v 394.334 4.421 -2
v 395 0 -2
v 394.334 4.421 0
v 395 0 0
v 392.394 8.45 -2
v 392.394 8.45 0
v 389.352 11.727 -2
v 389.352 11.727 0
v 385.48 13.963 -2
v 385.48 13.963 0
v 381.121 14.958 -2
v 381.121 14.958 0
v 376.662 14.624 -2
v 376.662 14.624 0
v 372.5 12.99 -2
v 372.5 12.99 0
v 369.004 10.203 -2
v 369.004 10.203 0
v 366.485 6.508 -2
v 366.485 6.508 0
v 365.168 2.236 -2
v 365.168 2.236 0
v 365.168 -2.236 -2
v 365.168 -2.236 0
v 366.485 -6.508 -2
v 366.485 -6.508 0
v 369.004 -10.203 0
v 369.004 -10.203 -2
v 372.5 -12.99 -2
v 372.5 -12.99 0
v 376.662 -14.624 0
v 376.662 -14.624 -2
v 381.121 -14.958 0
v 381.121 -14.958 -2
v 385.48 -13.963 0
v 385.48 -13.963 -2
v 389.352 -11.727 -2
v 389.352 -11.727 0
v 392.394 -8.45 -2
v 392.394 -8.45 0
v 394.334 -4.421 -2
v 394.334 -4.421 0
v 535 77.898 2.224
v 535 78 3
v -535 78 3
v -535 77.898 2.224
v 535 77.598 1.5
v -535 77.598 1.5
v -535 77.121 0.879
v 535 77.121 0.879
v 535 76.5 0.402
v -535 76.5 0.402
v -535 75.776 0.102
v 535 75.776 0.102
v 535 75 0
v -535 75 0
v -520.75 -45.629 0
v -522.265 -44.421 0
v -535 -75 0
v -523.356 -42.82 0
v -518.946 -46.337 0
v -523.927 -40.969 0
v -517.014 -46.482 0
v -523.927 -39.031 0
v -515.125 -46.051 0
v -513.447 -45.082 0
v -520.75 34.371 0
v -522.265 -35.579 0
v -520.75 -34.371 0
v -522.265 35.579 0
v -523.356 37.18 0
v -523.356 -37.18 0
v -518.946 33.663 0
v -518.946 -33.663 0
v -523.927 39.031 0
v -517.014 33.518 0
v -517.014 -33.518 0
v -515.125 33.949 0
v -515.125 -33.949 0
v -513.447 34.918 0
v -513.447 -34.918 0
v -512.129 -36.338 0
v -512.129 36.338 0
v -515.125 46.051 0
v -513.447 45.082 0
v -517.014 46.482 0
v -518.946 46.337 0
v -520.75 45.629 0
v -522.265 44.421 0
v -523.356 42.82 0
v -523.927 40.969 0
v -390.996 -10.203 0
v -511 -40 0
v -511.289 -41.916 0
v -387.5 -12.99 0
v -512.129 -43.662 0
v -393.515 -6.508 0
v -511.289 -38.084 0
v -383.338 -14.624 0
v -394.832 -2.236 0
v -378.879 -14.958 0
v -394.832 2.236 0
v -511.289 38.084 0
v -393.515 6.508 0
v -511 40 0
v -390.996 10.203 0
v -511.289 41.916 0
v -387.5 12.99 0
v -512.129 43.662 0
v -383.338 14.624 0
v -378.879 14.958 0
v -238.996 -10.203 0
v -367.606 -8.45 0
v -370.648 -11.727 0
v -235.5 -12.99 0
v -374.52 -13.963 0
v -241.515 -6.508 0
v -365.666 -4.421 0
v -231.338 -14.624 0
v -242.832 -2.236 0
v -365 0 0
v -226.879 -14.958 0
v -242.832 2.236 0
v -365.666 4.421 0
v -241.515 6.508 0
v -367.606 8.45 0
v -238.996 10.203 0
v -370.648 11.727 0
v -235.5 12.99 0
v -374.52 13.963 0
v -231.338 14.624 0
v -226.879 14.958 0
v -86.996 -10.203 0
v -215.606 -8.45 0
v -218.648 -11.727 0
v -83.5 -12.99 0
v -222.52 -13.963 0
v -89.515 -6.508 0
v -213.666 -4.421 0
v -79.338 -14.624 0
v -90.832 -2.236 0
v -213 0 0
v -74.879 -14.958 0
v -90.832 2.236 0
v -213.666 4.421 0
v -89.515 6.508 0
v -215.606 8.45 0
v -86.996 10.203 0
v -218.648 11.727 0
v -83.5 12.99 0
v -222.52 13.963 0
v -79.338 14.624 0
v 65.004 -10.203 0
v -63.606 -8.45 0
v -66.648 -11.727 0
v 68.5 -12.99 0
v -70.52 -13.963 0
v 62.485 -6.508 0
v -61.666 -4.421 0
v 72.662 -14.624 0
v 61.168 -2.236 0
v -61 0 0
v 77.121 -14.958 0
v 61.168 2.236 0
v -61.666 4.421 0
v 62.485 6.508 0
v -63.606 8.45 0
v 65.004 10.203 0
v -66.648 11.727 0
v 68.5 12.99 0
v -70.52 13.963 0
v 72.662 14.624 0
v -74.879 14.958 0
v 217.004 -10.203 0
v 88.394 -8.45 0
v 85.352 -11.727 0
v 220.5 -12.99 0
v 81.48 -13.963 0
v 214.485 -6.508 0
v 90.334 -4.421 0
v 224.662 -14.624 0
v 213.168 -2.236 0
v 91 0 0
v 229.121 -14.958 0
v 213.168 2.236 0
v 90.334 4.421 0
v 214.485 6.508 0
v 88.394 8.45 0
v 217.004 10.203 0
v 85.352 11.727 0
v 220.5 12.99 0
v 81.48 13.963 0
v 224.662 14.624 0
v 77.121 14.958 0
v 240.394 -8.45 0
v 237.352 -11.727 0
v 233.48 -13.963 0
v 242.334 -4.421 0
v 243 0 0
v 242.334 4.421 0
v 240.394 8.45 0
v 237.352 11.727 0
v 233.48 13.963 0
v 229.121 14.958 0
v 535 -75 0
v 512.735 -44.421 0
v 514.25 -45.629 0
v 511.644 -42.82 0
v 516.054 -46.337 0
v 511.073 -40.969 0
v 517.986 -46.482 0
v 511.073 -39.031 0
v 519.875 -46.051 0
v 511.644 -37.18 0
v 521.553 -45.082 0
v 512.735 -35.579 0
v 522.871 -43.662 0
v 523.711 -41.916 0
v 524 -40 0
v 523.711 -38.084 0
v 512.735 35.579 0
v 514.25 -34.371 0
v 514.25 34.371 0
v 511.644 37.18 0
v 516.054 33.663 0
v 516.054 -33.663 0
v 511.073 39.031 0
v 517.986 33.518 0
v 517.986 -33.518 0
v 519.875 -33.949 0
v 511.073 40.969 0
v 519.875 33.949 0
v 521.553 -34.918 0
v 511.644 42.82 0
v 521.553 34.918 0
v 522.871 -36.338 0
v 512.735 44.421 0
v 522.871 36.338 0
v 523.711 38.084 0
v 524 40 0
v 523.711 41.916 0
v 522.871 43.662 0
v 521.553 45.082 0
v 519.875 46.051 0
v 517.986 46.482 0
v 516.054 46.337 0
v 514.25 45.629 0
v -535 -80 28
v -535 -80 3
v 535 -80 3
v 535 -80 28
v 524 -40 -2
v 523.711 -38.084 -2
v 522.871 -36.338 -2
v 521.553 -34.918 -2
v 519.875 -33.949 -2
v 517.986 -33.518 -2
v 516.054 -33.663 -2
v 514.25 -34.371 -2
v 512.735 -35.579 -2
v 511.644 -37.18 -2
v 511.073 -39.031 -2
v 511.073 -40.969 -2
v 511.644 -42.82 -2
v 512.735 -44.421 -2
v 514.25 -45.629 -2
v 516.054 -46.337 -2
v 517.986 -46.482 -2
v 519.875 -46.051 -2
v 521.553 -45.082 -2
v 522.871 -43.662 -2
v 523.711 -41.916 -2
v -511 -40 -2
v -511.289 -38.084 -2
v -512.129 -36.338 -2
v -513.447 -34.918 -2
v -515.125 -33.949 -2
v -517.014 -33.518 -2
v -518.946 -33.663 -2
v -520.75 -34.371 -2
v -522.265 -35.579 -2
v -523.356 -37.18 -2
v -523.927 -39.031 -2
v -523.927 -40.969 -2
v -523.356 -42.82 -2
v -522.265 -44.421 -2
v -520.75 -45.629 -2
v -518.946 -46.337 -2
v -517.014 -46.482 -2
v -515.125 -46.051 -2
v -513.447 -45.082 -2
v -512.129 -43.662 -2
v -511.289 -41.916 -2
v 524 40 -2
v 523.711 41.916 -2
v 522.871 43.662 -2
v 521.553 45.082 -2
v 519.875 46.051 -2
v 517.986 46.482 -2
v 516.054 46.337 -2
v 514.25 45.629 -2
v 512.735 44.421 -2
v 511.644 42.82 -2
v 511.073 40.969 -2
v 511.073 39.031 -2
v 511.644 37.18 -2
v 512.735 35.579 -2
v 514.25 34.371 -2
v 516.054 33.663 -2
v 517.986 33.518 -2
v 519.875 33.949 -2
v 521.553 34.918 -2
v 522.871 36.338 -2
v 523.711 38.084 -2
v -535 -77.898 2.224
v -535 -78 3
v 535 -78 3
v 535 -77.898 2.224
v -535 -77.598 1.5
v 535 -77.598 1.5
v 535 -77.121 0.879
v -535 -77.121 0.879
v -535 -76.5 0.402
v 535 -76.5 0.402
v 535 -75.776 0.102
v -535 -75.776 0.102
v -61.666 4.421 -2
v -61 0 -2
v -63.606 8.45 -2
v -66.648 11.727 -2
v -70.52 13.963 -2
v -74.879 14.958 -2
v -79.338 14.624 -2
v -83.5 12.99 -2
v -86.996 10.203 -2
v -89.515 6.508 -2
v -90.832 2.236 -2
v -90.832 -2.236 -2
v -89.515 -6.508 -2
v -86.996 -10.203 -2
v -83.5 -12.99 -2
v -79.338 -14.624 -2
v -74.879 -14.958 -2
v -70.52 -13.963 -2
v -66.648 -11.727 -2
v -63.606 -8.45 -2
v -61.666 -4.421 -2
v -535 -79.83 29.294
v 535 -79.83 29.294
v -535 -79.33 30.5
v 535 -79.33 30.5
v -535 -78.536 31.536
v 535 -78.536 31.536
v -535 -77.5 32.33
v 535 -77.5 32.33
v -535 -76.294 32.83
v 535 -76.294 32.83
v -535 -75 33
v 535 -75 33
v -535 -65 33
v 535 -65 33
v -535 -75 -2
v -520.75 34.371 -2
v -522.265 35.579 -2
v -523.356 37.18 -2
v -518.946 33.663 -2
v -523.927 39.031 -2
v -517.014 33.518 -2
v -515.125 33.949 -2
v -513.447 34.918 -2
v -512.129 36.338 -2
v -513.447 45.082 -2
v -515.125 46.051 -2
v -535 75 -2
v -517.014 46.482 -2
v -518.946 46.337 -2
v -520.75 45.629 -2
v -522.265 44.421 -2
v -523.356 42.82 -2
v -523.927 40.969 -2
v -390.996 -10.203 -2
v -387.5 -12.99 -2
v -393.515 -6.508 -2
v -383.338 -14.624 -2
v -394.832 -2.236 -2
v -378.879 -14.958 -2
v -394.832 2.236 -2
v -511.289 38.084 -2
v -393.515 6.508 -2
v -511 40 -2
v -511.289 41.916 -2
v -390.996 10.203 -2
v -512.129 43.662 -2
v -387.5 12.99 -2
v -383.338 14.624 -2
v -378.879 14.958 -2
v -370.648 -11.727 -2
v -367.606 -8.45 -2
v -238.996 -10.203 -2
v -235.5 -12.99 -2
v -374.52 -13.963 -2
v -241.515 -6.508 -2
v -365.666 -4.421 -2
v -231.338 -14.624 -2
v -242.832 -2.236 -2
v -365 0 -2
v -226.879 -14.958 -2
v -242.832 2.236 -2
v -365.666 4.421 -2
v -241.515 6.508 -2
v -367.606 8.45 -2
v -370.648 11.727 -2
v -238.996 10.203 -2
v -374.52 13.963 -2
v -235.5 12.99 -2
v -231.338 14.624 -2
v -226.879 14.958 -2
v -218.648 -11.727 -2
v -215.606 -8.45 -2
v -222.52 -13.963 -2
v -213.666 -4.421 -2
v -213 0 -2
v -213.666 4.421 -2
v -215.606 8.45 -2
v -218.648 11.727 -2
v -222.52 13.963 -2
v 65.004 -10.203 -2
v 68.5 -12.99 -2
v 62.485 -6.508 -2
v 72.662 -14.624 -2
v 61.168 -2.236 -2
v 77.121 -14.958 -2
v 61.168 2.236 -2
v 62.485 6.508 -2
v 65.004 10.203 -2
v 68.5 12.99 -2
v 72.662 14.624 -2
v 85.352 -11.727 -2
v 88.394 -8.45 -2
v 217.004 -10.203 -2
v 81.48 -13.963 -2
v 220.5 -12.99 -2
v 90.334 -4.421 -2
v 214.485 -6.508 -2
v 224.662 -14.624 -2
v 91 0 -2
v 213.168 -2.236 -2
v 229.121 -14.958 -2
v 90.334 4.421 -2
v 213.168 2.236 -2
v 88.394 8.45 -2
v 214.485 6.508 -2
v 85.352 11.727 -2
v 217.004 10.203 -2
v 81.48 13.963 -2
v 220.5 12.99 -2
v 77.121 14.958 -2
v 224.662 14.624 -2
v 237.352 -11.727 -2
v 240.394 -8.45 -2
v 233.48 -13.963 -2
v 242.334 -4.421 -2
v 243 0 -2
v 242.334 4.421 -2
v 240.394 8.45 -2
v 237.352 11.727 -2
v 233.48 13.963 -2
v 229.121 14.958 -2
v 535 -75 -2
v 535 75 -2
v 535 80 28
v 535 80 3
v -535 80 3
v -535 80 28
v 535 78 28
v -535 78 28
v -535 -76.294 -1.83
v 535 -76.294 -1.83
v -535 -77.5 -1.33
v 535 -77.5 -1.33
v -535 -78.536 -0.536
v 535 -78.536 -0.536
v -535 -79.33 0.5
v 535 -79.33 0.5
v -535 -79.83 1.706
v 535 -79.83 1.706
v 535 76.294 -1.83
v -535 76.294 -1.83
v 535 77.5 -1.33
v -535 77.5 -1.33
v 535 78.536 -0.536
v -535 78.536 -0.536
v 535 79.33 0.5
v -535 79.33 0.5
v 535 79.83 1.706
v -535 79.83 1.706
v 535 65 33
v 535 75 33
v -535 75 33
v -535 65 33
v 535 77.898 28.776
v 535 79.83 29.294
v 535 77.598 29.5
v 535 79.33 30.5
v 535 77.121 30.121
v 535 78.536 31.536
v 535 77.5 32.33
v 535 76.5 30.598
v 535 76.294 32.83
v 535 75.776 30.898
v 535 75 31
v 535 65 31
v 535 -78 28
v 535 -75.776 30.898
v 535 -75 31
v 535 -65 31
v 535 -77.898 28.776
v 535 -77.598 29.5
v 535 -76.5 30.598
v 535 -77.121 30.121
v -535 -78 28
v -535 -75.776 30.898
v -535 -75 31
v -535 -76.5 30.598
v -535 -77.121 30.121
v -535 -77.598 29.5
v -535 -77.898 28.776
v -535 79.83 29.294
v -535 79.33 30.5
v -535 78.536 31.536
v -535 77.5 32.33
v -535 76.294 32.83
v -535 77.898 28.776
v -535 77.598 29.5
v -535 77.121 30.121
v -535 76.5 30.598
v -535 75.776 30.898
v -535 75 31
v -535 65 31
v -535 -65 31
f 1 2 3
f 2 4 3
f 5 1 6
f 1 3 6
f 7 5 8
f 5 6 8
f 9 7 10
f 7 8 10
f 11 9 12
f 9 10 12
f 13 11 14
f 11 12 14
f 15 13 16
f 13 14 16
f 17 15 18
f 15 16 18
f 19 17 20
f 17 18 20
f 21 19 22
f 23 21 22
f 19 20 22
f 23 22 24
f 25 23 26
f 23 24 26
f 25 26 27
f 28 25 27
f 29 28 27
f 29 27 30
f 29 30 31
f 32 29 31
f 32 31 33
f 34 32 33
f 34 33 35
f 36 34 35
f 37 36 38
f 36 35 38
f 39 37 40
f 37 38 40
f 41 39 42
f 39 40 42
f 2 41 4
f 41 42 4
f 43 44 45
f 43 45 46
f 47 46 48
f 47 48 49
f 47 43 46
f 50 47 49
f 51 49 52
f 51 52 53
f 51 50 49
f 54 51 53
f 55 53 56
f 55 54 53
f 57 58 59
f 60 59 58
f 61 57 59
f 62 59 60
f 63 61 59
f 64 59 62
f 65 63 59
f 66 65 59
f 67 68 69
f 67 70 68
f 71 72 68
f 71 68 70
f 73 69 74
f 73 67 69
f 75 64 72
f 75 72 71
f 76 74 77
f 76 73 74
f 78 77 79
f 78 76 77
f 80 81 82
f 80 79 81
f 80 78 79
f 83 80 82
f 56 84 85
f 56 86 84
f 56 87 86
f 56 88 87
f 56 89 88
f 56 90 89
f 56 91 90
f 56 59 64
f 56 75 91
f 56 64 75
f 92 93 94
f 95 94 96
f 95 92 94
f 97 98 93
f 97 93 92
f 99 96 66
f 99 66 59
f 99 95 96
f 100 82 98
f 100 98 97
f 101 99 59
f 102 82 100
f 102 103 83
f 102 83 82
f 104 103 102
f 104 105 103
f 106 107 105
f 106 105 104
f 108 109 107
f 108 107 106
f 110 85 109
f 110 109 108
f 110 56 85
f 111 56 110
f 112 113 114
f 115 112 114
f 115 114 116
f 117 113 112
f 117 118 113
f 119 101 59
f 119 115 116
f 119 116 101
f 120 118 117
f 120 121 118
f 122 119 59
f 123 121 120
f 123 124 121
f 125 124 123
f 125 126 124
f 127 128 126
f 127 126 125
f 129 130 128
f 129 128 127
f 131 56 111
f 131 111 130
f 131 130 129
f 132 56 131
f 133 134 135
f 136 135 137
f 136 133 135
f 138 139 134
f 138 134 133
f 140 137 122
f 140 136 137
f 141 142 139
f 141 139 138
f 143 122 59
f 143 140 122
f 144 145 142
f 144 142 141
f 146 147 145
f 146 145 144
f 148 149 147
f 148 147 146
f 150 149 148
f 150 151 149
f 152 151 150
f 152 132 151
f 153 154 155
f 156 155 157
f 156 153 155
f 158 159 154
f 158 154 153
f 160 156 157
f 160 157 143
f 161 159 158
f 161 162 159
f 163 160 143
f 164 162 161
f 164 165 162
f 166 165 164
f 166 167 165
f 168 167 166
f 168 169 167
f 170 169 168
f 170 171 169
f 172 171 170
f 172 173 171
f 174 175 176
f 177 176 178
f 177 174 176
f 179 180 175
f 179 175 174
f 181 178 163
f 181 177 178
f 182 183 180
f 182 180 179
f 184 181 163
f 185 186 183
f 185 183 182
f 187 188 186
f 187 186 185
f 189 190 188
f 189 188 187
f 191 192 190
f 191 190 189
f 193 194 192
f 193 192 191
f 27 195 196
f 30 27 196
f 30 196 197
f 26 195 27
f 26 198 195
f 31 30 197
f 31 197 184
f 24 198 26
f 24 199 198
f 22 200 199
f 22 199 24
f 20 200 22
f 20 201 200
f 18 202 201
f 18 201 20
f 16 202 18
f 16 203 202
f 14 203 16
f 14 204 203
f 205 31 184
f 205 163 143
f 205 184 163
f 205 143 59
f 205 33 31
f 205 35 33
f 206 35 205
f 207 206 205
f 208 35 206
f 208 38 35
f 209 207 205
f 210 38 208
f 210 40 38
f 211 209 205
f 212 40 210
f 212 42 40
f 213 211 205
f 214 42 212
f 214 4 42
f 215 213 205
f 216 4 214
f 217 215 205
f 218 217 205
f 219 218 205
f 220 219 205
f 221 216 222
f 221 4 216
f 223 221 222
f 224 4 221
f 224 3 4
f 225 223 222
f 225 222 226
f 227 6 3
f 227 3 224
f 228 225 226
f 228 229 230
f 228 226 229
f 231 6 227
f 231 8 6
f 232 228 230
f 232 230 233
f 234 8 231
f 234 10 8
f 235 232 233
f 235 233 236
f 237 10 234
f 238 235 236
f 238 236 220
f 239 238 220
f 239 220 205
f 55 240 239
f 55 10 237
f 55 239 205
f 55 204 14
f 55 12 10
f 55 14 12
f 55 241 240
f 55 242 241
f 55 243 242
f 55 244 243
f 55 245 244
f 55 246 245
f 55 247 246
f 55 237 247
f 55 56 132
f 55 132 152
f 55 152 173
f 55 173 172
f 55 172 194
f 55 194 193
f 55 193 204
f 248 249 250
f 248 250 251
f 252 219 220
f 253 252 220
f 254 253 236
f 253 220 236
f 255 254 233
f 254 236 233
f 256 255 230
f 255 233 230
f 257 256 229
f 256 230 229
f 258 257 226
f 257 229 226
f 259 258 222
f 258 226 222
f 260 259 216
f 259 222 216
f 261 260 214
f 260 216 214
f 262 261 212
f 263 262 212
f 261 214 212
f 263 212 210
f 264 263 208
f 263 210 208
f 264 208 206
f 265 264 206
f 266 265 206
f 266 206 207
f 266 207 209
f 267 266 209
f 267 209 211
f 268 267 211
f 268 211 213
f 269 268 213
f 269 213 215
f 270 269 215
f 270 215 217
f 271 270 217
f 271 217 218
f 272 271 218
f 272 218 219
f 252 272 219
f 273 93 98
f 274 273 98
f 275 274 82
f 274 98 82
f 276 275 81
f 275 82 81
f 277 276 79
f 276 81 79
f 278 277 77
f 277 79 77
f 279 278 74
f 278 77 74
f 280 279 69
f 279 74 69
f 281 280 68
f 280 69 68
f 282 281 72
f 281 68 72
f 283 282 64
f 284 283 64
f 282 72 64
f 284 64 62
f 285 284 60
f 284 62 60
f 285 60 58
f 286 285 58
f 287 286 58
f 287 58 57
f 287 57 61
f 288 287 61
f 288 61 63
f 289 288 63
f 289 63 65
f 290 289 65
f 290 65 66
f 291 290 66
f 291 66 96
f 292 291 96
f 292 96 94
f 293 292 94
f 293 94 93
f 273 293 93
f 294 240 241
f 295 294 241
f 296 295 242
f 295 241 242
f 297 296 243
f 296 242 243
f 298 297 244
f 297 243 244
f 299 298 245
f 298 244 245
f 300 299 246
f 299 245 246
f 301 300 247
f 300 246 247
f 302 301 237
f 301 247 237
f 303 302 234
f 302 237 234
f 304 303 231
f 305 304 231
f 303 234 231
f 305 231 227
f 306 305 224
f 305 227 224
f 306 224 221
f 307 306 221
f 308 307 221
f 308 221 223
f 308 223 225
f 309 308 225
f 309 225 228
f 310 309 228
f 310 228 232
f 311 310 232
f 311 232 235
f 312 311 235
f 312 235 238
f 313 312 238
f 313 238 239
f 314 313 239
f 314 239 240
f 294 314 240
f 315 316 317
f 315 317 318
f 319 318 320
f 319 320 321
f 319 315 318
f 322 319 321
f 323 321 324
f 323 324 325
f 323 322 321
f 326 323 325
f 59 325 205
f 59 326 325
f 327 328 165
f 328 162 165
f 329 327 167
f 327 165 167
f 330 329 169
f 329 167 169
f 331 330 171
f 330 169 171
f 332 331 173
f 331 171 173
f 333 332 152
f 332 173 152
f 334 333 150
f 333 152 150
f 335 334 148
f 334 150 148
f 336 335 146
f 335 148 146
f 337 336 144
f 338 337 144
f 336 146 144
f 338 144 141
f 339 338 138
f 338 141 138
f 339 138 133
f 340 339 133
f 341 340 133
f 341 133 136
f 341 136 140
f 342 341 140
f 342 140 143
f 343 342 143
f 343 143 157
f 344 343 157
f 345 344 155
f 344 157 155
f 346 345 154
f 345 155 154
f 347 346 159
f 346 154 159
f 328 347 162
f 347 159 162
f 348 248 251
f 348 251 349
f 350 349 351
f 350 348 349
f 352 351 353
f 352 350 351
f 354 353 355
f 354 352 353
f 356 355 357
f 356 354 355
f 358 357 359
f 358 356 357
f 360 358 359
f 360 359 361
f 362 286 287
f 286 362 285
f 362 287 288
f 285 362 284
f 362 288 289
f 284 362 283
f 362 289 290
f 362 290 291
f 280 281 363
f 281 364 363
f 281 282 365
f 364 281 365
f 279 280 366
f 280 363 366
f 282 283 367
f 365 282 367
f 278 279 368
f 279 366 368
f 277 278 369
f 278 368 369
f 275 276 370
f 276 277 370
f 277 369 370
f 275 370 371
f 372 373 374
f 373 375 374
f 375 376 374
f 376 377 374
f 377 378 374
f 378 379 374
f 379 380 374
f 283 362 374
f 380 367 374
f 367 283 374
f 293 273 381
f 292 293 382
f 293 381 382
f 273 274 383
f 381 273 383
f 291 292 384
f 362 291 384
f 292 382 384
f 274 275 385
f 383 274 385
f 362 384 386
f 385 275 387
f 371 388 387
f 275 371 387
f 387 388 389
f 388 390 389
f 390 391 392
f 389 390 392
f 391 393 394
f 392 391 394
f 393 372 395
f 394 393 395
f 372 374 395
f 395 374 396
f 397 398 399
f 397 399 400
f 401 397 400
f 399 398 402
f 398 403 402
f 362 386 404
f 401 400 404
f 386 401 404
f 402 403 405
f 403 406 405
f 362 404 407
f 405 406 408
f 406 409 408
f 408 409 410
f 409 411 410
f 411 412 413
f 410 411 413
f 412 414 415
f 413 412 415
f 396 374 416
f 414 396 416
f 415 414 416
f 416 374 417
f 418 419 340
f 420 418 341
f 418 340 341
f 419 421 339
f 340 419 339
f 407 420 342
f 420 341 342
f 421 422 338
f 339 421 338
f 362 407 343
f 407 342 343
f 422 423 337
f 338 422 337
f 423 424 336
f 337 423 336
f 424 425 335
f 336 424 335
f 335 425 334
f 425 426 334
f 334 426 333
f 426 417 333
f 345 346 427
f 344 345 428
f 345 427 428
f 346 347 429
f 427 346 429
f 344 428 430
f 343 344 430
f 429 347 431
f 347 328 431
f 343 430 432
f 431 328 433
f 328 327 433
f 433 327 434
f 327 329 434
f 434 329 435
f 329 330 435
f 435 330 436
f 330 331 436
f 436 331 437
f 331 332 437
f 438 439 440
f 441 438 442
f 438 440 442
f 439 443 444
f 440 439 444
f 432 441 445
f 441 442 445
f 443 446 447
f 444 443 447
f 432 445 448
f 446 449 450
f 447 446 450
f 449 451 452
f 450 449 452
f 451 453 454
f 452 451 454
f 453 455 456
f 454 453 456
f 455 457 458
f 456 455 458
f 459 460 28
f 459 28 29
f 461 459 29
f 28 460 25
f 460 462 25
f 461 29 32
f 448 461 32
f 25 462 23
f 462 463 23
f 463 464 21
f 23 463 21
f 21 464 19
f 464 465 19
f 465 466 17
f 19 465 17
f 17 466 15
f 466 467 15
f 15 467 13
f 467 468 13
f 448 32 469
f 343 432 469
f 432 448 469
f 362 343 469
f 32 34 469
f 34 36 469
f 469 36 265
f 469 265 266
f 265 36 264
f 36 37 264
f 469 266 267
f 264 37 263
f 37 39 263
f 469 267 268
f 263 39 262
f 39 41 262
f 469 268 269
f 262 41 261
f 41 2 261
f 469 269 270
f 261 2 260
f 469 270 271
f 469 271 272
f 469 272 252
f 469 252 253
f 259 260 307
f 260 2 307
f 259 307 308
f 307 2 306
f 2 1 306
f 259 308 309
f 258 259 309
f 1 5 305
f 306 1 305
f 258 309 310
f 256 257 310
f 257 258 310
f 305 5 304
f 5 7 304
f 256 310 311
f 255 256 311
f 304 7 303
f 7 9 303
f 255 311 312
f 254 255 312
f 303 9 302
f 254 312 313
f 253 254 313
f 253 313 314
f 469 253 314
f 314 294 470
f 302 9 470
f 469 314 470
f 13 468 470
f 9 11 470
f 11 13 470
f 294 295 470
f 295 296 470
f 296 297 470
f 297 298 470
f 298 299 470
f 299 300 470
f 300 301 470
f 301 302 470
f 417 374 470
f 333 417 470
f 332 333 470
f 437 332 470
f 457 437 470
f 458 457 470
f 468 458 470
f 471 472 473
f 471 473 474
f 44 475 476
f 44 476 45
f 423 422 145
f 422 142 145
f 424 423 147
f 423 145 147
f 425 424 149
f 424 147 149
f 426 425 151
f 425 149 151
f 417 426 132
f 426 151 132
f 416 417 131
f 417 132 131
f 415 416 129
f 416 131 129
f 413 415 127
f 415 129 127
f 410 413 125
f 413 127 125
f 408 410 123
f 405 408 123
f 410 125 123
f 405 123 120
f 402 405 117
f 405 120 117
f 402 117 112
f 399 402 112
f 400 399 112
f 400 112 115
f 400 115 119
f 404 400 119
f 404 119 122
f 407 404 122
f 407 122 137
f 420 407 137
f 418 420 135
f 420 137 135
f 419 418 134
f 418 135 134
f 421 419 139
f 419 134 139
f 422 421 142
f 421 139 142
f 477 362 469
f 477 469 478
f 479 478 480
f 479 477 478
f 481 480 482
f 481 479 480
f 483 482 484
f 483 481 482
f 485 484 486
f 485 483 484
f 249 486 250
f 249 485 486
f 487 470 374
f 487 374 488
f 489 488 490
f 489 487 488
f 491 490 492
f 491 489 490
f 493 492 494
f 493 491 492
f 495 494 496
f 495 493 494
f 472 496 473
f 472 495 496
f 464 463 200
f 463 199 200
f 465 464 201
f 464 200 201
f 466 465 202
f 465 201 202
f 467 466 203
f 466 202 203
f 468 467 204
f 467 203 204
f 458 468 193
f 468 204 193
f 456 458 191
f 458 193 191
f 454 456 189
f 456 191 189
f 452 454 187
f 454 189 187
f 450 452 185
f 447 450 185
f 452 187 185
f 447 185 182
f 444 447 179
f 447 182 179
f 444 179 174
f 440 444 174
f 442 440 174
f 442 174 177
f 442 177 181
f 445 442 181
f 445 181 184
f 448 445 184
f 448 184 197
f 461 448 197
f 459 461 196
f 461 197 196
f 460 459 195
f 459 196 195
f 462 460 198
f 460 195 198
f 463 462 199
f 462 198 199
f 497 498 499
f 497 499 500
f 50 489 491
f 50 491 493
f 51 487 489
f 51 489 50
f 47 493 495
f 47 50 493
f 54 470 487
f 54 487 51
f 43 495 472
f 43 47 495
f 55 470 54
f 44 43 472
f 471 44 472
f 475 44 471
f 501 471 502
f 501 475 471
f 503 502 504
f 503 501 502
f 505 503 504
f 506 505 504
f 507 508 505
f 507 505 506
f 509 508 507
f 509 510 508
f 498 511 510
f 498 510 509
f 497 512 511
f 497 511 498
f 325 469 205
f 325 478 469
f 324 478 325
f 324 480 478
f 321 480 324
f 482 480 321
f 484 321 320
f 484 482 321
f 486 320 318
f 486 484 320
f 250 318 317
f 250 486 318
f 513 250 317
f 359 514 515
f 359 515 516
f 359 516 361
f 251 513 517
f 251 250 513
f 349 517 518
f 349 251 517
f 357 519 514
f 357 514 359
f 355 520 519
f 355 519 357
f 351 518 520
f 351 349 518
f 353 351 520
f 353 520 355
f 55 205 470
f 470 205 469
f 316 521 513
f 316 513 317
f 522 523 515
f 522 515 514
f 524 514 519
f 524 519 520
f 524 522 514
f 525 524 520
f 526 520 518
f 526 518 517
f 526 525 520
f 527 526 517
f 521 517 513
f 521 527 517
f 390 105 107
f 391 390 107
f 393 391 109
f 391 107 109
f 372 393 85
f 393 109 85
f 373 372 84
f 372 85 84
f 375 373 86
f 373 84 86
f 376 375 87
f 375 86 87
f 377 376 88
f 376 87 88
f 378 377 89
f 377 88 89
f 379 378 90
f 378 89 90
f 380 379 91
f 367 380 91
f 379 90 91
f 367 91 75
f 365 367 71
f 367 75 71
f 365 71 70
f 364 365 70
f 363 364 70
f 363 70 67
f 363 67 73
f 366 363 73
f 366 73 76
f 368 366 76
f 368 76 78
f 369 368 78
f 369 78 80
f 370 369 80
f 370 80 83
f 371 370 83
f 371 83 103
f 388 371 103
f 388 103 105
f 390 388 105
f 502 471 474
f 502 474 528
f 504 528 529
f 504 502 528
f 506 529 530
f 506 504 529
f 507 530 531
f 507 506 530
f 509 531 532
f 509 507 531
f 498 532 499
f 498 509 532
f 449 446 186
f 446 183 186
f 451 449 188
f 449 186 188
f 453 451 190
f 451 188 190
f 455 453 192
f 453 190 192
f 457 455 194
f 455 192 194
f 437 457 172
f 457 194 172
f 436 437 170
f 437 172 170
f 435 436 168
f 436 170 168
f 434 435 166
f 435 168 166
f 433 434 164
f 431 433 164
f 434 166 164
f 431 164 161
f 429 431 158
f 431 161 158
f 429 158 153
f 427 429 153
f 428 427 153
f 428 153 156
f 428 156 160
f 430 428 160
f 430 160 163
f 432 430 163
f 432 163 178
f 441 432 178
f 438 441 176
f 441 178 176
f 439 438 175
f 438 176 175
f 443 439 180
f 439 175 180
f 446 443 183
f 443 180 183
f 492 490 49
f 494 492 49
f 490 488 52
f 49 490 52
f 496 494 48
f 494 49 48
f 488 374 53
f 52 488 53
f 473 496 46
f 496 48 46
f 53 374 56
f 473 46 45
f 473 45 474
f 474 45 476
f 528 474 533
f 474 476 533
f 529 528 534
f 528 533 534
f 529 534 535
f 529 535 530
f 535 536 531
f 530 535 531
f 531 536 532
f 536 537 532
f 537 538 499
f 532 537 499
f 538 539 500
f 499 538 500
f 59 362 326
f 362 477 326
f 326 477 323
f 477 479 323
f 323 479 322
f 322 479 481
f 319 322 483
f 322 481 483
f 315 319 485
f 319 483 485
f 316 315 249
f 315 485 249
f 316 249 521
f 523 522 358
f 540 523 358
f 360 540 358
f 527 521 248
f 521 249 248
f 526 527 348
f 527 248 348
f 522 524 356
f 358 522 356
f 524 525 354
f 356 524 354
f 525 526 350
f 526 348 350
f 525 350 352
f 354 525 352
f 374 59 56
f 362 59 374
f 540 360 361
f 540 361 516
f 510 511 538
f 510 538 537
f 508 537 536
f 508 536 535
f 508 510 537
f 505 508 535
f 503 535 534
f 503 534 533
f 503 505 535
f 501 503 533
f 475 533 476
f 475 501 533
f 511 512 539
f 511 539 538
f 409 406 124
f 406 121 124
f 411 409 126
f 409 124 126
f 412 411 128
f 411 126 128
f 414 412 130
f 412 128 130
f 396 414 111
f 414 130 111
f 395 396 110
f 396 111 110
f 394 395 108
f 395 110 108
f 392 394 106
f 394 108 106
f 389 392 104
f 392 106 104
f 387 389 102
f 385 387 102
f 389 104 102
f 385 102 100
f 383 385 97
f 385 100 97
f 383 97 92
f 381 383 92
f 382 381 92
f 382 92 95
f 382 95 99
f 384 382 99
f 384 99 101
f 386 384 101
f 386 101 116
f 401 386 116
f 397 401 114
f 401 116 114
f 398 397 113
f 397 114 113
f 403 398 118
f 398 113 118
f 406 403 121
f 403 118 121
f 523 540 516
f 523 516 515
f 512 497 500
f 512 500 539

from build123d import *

# Parameters (mm, degrees)
SKETCH1_W                      = 1070
SKETCH1_H                      = 160
BASE_FLANGE1_DEPTH             = 2
EDGE_FLANGE1_STRIP_W           = 14
EDGE_FLANGE1_STRIP_H           = 2
EDGE_FLANGE1_STRIP_CUT_DEPTH   = 1070
EDGE_FLANGE1_STRIP_2_W         = 14
EDGE_FLANGE1_STRIP_2_H         = 2
EDGE_FLANGE1_STRIP_CUT_2_DEPTH = 1070
EDGE_FLANGE1_DEPTH             = 1070
EDGE_FLANGE1_BEND_DEPTH        = 1070
EDGE_FLANGE2_STRIP_W           = 14
EDGE_FLANGE2_STRIP_H           = 2
EDGE_FLANGE2_STRIP_CUT_DEPTH   = 1070
EDGE_FLANGE2_STRIP_2_W         = 14
EDGE_FLANGE2_STRIP_2_H         = 2
EDGE_FLANGE2_STRIP_CUT_2_DEPTH = 1070
EDGE_FLANGE2_DEPTH             = 1070
EDGE_FLANGE2_BEND_DEPTH        = 1070
SKETCH18_R                     = 6.5
CUT_EXTRUDE1_DEPTH             = 10
SKETCH19_R                     = 15
CUT_EXTRUDE2_DEPTH             = 542.953872576
LPATTERN1_COUNT                = 6
LPATTERN1_PITCH                = 152


# Sheet-metal steps are written as plain solids
with BuildPart() as part:
    # Sketch1 → Base-Flange1 (new body)
    with BuildSketch(Plane.XY):
        Rectangle(SKETCH1_W, SKETCH1_H)
    extrude(amount=-BASE_FLANGE1_DEPTH)

    # Edge-Flange1 strip (across the edge) → Edge-Flange1 strip cut (cut)
    with BuildSketch(Plane(origin=(535, 80, 0), x_dir=(0, -1, 0), z_dir=(-1, 0, 0))):
        with Locations((-2, -1)):
            Rectangle(EDGE_FLANGE1_STRIP_W, EDGE_FLANGE1_STRIP_H)
    extrude(amount=EDGE_FLANGE1_STRIP_CUT_DEPTH, mode=Mode.SUBTRACT)

    # Edge-Flange1 strip 2 (across the edge) → Edge-Flange1 strip cut 2 (cut)
    with BuildSketch(Plane(origin=(-535, -80, 0), x_dir=(0, 1, 0), z_dir=(1, 0, 0))):
        with Locations((-2, -1)):
            Rectangle(EDGE_FLANGE1_STRIP_2_W, EDGE_FLANGE1_STRIP_2_H)
    extrude(amount=EDGE_FLANGE1_STRIP_CUT_2_DEPTH, mode=Mode.SUBTRACT)

    # Edge-Flange1 section (across the edge) → Edge-Flange1 (add)
    with BuildSketch(Plane(origin=(535, 80, 0), x_dir=(0, -1, 0), z_dir=(-1, 0, 0))):
        with BuildLine():
            Line((0, 3), (0, 33))
            Line((0, 33), (2, 33))
            Line((2, 33), (2, 3))
            ThreePointArc((2, 3), (2.878679656, 0.878679656), (5, 0))
            Line((5, 0), (5, -2))
            ThreePointArc((5, -2), (1.464466094, -0.535533906), (0, 3))
        make_face()
    extrude(amount=EDGE_FLANGE1_DEPTH)

    # Edge-Flange1 section 2 (across the edge) → Edge-Flange1 bend (add)
    with BuildSketch(Plane(origin=(-535, -80, 0), x_dir=(0, 1, 0), z_dir=(1, 0, 0))):
        with BuildLine():
            Line((0, 3), (0, 33))
            Line((0, 33), (2, 33))
            Line((2, 33), (2, 3))
            ThreePointArc((2, 3), (2.878679656, 0.878679656), (5, 0))
            Line((5, 0), (5, -2))
            ThreePointArc((5, -2), (1.464466094, -0.535533906), (0, 3))
        make_face()
    extrude(amount=EDGE_FLANGE1_BEND_DEPTH)

    # Edge-Flange2 strip (across the edge) → Edge-Flange2 strip cut (cut)
    with BuildSketch(Plane(origin=(-535, -78, 33), x_dir=(0, 0, -1), z_dir=(1, 0, 0))):
        with Locations((-2, -1)):
            Rectangle(EDGE_FLANGE2_STRIP_W, EDGE_FLANGE2_STRIP_H)
    extrude(amount=EDGE_FLANGE2_STRIP_CUT_DEPTH, mode=Mode.SUBTRACT)

    # Edge-Flange2 strip 2 (across the edge) → Edge-Flange2 strip cut 2 (cut)
    with BuildSketch(Plane(origin=(535, 78, 33), x_dir=(0, 0, -1), z_dir=(-1, 0, 0))):
        with Locations((-2, -1)):
            Rectangle(EDGE_FLANGE2_STRIP_2_W, EDGE_FLANGE2_STRIP_2_H)
    extrude(amount=EDGE_FLANGE2_STRIP_CUT_2_DEPTH, mode=Mode.SUBTRACT)

    # Edge-Flange2 section (across the edge) → Edge-Flange2 (add)
    with BuildSketch(Plane(origin=(-535, -78, 33), x_dir=(0, 0, -1), z_dir=(1, 0, 0))):
        with BuildLine():
            Line((0, 3), (0, 13))
            Line((0, 13), (2, 13))
            Line((2, 13), (2, 3))
            ThreePointArc((2, 3), (2.878679656, 0.878679656), (5, 0))
            Line((5, 0), (5, -2))
            ThreePointArc((5, -2), (1.464466094, -0.535533906), (0, 3))
        make_face()
    extrude(amount=EDGE_FLANGE2_DEPTH)

    # Edge-Flange2 section 2 (across the edge) → Edge-Flange2 bend (add)
    with BuildSketch(Plane(origin=(535, 78, 33), x_dir=(0, 0, -1), z_dir=(-1, 0, 0))):
        with BuildLine():
            Line((0, 3), (0, 13))
            Line((0, 13), (2, 13))
            Line((2, 13), (2, 3))
            ThreePointArc((2, 3), (2.878679656, 0.878679656), (5, 0))
            Line((5, 0), (5, -2))
            ThreePointArc((5, -2), (1.464466094, -0.535533906), (0, 3))
        make_face()
    extrude(amount=EDGE_FLANGE2_BEND_DEPTH)

    # Sketch18 → Cut-Extrude1 (cut)
    with BuildSketch(Plane.XY):
        with Locations((-517.5, 40)):
            Circle(SKETCH18_R)
        with Locations((-517.5, -40)):
            Circle(SKETCH18_R)
        with Locations((517.5, -40)):
            Circle(SKETCH18_R)
        with Locations((517.5, 40)):
            Circle(SKETCH18_R)
    extrude(amount=-CUT_EXTRUDE1_DEPTH, mode=Mode.SUBTRACT)

    # Sketch19 → Cut-Extrude2 (cut, symmetric)
    with BuildSketch(Plane.XY):
        with Locations((380, 0)):
            Circle(SKETCH19_R)
    cut_extrude2 = extrude(amount=CUT_EXTRUDE2_DEPTH, both=True, mode=Mode.SUBTRACT)

    # LPattern1: Cut-Extrude2 ×6
    with Locations(*[(-i * LPATTERN1_PITCH, 0, 0) for i in range(1, LPATTERN1_COUNT)]):
        add(cut_extrude2, mode=Mode.SUBTRACT)


solid = part.part
